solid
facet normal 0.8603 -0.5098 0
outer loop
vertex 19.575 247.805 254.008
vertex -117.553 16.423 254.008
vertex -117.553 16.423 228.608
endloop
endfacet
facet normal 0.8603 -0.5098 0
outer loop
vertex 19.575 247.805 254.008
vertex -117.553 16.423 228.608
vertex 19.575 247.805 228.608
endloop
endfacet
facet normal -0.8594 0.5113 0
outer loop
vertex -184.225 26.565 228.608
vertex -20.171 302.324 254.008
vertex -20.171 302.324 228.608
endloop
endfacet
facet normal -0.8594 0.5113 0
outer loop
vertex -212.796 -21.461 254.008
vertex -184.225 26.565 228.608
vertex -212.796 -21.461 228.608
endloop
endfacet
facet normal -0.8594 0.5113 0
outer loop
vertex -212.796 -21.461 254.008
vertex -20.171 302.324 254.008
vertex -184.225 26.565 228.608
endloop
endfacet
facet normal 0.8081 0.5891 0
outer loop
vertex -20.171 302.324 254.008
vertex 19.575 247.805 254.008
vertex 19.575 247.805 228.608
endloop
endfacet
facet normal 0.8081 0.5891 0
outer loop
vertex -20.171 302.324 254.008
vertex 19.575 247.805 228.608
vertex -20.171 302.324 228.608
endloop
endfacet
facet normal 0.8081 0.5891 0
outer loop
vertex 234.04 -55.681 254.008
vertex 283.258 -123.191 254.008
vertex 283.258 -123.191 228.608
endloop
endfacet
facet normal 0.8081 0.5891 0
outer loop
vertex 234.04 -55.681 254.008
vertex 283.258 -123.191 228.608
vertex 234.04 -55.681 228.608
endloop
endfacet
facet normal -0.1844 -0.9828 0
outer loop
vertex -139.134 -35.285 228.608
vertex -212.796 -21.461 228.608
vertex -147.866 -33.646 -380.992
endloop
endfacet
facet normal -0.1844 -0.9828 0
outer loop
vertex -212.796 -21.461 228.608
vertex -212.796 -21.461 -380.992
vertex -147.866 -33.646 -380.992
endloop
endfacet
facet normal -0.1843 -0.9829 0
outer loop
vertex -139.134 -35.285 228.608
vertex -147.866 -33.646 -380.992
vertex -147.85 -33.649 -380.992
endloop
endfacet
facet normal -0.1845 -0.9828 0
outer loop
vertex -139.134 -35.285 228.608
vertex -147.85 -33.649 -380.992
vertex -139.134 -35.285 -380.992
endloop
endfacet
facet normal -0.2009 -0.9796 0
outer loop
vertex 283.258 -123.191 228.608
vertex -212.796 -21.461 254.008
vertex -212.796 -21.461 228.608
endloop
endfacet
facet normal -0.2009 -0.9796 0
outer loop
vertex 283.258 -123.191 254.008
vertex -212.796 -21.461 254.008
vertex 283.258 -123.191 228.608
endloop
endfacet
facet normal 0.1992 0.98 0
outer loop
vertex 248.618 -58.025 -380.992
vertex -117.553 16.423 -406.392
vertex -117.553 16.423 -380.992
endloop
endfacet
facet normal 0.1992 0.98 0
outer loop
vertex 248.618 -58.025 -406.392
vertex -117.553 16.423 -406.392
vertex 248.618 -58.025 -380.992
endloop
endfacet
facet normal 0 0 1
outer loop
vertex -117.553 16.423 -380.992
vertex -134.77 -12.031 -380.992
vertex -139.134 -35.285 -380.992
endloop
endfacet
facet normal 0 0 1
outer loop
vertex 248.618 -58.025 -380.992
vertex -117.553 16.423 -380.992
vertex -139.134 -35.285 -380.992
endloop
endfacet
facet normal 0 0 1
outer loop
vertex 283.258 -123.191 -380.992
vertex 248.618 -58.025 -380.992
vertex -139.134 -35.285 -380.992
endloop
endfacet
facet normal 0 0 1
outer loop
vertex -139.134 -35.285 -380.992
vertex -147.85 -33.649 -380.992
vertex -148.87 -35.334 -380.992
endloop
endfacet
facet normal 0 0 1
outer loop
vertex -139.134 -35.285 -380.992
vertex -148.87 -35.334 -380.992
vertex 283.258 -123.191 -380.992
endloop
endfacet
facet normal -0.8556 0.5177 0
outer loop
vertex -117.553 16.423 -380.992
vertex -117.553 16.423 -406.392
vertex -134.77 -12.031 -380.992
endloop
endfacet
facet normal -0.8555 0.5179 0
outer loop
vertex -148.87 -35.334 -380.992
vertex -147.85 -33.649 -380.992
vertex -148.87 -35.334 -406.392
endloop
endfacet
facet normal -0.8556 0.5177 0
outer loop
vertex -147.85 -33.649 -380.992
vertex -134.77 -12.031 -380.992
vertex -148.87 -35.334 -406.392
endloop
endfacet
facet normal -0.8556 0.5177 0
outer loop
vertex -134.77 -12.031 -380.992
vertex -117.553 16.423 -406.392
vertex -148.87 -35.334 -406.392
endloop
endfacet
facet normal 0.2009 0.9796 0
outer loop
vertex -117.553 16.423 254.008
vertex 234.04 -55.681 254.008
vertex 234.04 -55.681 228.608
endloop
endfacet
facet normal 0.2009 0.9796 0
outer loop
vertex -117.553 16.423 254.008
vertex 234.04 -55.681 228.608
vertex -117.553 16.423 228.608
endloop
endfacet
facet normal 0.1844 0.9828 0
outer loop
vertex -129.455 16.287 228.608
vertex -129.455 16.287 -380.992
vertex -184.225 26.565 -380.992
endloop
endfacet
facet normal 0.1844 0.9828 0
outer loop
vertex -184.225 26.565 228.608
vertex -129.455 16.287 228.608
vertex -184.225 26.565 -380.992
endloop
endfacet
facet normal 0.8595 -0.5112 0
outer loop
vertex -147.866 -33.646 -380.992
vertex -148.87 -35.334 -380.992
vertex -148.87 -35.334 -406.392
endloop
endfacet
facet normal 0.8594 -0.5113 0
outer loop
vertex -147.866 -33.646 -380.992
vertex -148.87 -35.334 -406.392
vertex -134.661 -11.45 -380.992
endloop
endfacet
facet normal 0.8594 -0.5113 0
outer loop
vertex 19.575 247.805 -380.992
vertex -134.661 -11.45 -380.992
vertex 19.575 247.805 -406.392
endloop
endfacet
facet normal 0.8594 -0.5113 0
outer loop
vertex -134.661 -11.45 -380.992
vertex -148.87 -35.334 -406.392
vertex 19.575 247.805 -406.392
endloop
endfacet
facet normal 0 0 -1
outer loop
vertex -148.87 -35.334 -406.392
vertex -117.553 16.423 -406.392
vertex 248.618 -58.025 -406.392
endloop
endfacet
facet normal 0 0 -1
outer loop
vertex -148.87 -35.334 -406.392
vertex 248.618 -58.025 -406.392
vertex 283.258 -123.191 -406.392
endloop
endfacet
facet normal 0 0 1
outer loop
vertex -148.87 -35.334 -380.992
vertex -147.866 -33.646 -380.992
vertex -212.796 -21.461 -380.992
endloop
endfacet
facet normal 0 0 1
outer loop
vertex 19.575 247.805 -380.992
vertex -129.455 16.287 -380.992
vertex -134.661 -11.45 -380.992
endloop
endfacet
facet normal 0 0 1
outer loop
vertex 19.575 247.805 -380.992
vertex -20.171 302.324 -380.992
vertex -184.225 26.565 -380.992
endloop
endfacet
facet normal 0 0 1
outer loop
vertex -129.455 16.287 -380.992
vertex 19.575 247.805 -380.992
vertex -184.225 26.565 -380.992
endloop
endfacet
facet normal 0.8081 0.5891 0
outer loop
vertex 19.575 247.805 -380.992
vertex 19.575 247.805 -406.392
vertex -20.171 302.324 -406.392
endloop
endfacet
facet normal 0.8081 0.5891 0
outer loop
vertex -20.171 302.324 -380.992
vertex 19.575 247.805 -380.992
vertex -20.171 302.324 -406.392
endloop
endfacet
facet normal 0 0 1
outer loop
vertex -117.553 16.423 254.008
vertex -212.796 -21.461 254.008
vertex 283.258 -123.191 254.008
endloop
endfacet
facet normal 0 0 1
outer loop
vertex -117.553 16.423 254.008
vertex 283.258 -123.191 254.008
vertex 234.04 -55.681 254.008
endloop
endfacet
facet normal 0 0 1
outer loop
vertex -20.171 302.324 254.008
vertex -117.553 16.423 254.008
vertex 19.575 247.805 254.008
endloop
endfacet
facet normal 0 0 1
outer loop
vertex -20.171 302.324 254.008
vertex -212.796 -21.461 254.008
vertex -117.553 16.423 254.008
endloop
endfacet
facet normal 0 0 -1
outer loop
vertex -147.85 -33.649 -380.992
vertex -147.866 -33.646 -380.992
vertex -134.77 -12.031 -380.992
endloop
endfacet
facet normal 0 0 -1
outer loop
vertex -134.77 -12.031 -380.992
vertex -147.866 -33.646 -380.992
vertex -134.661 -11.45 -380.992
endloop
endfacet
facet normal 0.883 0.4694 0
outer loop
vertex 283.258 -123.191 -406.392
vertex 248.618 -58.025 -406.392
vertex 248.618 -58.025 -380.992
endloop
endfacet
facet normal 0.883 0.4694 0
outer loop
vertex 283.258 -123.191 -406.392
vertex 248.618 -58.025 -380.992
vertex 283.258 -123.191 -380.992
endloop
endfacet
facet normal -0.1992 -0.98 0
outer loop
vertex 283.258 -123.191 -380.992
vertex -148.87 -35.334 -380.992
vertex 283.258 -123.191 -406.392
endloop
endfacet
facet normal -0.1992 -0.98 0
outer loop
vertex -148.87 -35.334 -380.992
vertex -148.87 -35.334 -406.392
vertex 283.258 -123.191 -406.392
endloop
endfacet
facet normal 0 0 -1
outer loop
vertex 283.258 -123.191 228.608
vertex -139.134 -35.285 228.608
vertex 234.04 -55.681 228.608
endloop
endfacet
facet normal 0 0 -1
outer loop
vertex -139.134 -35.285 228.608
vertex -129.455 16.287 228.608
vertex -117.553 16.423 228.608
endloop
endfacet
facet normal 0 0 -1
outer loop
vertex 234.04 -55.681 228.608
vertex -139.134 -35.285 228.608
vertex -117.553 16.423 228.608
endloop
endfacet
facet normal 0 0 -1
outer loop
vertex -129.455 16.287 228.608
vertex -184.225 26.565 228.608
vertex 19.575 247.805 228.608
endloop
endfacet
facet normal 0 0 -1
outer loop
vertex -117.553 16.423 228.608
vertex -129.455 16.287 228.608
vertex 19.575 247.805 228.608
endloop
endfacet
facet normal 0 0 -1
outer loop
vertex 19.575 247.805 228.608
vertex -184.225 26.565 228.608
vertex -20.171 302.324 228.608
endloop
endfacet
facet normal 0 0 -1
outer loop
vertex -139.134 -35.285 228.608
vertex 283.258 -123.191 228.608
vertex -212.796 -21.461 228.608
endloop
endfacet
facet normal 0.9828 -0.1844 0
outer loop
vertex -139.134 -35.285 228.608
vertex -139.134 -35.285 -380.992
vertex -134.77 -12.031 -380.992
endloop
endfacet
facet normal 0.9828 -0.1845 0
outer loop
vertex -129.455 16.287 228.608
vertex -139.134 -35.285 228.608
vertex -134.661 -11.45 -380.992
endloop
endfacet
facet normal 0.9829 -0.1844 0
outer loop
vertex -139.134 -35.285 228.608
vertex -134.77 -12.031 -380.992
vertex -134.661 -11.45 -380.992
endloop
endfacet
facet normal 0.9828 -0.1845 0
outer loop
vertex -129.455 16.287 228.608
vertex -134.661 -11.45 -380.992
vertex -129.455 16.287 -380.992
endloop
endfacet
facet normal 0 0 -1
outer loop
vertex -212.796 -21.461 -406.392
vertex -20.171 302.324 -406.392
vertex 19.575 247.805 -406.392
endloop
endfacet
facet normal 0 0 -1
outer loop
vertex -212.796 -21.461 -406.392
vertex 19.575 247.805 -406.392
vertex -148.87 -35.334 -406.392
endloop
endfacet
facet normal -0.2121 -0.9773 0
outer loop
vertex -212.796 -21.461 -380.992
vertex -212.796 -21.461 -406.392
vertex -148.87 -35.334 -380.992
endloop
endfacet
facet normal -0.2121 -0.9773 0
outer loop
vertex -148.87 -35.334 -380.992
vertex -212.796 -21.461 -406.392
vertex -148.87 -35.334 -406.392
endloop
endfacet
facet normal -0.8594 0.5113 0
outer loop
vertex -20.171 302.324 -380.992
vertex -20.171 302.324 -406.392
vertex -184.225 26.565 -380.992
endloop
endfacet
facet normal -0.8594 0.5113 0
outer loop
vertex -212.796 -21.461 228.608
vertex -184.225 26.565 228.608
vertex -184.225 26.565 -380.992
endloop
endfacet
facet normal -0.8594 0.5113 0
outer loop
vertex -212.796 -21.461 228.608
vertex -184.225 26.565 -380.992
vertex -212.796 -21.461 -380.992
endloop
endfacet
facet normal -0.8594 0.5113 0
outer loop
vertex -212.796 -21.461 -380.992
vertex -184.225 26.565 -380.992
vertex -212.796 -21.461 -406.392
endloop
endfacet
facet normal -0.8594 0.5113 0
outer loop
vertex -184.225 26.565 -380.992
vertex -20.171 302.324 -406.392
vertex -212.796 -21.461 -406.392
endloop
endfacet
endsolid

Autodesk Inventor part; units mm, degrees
ref_plane "YZ Plane" through (0, 0, 0) normal (1, 0, 0) x (0, 1, 0)
ref_plane "XZ Plane" through (0, 0, 0) normal (0, 1, 0) x (-1, 0, 0)
ref_plane "XY Plane" through (0, 0, 0) normal (0, 0, 1) x (1, 0, 0)
ref_plane "Work Plane1" through (1143.7783, 851.9673, -406.3915) normal (0, 0, -1) x (-0.8080578, -0.5891032, 0)
sketch "Sketch1" plane through (1143.7783, 851.9673, -406.3915) normal (0, 0, -1) x (-0.8080578, -0.5891032, 0)
  line L0 (1269.8194, 209.303) -> (1593.8019, 73.5805)
  line L1 (1593.8019, 73.5805) -> (1269.8194, -281.049)
  line L2 (1259.4205, 173.4665) -> (1567.246, 44.5125)
  line L3 (1511.4503, 67.8864) -> (1259.4205, -207.9841)
  line L4 (1259.4205, 213.6593) -> (1259.4205, 173.4665)
  line L5 (1259.4205, -207.9841) -> (1269.8194, -281.049)
  point P0 (1426.1356, -14.6355)
extrude "Extrusion1" add sketch "Sketch1" against normal blind 25.4
ref_plane "Work Plane3" through (1143.7783, 851.9673, -406.3915) normal (0, 0, -1) x (-0.8080578, -0.5891032, 0)
sketch "Sketch3" plane through (1143.7783, 851.9673, -406.3915) normal (0, 0, -1) x (-0.8080578, -0.5891032, 0)
  line L0 (1264.3348, 241.5423) -> (1610.7303, 93.3818)
  line L1 (1511.4503, 67.8864) -> (1567.246, 44.5125) projected
  line L2 (1610.7303, 93.3818) -> (1567.246, 44.5125)
  line L3 (1567.246, 44.5125) -> (1264.3348, 174.0739)
  line L4 (1264.3348, 174.0739) -> (1264.3348, 241.5423)
  point P0 (1426.1356, -14.6355)
extrude "Extrusion3" add sketch "Sketch3" against normal blind 25.4
ref_plane "Work Plane4" through (1129.2131, 527.0149, 254.0085) normal (0, 0, 1) x (0.8080578, 0.5891032, 0)
sketch "Sketch4" plane through (1129.2131, 527.0149, 254.0085) normal (0, 0, 1) x (0.8080578, 0.5891032, 0)
  line L0 (-1061.1348, 428.0739) -> (-1061.1348, 495.5423) projected
  line L1 (-1061.1348, 495.5423) -> (-1407.5303, 347.3818) projected
  line L2 (-1061.1348, 495.5423) -> (-1407.5303, 347.3818)
  line L3 (-1364.046, 298.5125) -> (-1066.6194, -27.049) projected
  line L4 (-1407.5303, 347.3818) -> (-1066.6194, -27.049)
  line L5 (-1066.6194, -27.049) -> (-1066.6194, 56.4973)
  line L6 (-1308.2503, 321.8864) -> (-1364.046, 298.5125) projected
  line L7 (-1066.6194, 56.4973) -> (-1308.2503, 321.8864)
  line L8 (-1364.046, 298.5125) -> (-1061.1348, 428.0739) projected
  line L9 (-1308.2503, 321.8864) -> (-1061.1348, 428.0739)
  line L10 (-1061.1348, 428.0739) -> (-1061.1348, 495.5423)
  line L11 (-1407.5303, 347.3818) -> (-1364.046, 298.5125) projected
  line L12 (-1407.5303, 347.3818) -> (-1343.0061, 374.9801)
  line L13 (-1308.2503, 321.8864) -> (-1364.046, 298.5125)
  point P0 (-1222.9356, 239.3645)
  point P1 (-1364.046, 298.5125)
  point P2 (-1293.9365, 306.2186)
extrude "Extrusion4" add sketch "Sketch4" against normal blind 25.4 contours L8 L4 L1 L0 | L9 L6 L4 L8 | L7 L5 L4 L6
sketch "Sketch5" plane through (1143.7783, 851.9673, -380.9915) normal (0, 0, 1) x (0.8080578, 0.5891032, 0)
  line L0 (-1567.246, 44.5125) -> (-1264.3348, 174.0739) projected
  line L1 (-1514.0603, 67.2611) -> (-1559.35, 115.3583)
  line L2 (-1264.3348, 241.5423) -> (-1610.7303, 93.3818) projected
  line L3 (-1610.7303, 93.3818) -> (-1559.35, 38.8164)
  line L4 (-1559.35, 38.8164) -> (-1521.1481, 74.7883)
  point P0 (-1426.1356, -14.6355)
  point P1 (-1264.3348, 174.0739)
  point P2 (-1584.1346, -28.1729)
extrude "Extrusion5" add sketch "Sketch5" along normal blind 635 contours L3 L2 L1 L4 L0 | L0 L4 L3
properties part number "RearCrumple"
